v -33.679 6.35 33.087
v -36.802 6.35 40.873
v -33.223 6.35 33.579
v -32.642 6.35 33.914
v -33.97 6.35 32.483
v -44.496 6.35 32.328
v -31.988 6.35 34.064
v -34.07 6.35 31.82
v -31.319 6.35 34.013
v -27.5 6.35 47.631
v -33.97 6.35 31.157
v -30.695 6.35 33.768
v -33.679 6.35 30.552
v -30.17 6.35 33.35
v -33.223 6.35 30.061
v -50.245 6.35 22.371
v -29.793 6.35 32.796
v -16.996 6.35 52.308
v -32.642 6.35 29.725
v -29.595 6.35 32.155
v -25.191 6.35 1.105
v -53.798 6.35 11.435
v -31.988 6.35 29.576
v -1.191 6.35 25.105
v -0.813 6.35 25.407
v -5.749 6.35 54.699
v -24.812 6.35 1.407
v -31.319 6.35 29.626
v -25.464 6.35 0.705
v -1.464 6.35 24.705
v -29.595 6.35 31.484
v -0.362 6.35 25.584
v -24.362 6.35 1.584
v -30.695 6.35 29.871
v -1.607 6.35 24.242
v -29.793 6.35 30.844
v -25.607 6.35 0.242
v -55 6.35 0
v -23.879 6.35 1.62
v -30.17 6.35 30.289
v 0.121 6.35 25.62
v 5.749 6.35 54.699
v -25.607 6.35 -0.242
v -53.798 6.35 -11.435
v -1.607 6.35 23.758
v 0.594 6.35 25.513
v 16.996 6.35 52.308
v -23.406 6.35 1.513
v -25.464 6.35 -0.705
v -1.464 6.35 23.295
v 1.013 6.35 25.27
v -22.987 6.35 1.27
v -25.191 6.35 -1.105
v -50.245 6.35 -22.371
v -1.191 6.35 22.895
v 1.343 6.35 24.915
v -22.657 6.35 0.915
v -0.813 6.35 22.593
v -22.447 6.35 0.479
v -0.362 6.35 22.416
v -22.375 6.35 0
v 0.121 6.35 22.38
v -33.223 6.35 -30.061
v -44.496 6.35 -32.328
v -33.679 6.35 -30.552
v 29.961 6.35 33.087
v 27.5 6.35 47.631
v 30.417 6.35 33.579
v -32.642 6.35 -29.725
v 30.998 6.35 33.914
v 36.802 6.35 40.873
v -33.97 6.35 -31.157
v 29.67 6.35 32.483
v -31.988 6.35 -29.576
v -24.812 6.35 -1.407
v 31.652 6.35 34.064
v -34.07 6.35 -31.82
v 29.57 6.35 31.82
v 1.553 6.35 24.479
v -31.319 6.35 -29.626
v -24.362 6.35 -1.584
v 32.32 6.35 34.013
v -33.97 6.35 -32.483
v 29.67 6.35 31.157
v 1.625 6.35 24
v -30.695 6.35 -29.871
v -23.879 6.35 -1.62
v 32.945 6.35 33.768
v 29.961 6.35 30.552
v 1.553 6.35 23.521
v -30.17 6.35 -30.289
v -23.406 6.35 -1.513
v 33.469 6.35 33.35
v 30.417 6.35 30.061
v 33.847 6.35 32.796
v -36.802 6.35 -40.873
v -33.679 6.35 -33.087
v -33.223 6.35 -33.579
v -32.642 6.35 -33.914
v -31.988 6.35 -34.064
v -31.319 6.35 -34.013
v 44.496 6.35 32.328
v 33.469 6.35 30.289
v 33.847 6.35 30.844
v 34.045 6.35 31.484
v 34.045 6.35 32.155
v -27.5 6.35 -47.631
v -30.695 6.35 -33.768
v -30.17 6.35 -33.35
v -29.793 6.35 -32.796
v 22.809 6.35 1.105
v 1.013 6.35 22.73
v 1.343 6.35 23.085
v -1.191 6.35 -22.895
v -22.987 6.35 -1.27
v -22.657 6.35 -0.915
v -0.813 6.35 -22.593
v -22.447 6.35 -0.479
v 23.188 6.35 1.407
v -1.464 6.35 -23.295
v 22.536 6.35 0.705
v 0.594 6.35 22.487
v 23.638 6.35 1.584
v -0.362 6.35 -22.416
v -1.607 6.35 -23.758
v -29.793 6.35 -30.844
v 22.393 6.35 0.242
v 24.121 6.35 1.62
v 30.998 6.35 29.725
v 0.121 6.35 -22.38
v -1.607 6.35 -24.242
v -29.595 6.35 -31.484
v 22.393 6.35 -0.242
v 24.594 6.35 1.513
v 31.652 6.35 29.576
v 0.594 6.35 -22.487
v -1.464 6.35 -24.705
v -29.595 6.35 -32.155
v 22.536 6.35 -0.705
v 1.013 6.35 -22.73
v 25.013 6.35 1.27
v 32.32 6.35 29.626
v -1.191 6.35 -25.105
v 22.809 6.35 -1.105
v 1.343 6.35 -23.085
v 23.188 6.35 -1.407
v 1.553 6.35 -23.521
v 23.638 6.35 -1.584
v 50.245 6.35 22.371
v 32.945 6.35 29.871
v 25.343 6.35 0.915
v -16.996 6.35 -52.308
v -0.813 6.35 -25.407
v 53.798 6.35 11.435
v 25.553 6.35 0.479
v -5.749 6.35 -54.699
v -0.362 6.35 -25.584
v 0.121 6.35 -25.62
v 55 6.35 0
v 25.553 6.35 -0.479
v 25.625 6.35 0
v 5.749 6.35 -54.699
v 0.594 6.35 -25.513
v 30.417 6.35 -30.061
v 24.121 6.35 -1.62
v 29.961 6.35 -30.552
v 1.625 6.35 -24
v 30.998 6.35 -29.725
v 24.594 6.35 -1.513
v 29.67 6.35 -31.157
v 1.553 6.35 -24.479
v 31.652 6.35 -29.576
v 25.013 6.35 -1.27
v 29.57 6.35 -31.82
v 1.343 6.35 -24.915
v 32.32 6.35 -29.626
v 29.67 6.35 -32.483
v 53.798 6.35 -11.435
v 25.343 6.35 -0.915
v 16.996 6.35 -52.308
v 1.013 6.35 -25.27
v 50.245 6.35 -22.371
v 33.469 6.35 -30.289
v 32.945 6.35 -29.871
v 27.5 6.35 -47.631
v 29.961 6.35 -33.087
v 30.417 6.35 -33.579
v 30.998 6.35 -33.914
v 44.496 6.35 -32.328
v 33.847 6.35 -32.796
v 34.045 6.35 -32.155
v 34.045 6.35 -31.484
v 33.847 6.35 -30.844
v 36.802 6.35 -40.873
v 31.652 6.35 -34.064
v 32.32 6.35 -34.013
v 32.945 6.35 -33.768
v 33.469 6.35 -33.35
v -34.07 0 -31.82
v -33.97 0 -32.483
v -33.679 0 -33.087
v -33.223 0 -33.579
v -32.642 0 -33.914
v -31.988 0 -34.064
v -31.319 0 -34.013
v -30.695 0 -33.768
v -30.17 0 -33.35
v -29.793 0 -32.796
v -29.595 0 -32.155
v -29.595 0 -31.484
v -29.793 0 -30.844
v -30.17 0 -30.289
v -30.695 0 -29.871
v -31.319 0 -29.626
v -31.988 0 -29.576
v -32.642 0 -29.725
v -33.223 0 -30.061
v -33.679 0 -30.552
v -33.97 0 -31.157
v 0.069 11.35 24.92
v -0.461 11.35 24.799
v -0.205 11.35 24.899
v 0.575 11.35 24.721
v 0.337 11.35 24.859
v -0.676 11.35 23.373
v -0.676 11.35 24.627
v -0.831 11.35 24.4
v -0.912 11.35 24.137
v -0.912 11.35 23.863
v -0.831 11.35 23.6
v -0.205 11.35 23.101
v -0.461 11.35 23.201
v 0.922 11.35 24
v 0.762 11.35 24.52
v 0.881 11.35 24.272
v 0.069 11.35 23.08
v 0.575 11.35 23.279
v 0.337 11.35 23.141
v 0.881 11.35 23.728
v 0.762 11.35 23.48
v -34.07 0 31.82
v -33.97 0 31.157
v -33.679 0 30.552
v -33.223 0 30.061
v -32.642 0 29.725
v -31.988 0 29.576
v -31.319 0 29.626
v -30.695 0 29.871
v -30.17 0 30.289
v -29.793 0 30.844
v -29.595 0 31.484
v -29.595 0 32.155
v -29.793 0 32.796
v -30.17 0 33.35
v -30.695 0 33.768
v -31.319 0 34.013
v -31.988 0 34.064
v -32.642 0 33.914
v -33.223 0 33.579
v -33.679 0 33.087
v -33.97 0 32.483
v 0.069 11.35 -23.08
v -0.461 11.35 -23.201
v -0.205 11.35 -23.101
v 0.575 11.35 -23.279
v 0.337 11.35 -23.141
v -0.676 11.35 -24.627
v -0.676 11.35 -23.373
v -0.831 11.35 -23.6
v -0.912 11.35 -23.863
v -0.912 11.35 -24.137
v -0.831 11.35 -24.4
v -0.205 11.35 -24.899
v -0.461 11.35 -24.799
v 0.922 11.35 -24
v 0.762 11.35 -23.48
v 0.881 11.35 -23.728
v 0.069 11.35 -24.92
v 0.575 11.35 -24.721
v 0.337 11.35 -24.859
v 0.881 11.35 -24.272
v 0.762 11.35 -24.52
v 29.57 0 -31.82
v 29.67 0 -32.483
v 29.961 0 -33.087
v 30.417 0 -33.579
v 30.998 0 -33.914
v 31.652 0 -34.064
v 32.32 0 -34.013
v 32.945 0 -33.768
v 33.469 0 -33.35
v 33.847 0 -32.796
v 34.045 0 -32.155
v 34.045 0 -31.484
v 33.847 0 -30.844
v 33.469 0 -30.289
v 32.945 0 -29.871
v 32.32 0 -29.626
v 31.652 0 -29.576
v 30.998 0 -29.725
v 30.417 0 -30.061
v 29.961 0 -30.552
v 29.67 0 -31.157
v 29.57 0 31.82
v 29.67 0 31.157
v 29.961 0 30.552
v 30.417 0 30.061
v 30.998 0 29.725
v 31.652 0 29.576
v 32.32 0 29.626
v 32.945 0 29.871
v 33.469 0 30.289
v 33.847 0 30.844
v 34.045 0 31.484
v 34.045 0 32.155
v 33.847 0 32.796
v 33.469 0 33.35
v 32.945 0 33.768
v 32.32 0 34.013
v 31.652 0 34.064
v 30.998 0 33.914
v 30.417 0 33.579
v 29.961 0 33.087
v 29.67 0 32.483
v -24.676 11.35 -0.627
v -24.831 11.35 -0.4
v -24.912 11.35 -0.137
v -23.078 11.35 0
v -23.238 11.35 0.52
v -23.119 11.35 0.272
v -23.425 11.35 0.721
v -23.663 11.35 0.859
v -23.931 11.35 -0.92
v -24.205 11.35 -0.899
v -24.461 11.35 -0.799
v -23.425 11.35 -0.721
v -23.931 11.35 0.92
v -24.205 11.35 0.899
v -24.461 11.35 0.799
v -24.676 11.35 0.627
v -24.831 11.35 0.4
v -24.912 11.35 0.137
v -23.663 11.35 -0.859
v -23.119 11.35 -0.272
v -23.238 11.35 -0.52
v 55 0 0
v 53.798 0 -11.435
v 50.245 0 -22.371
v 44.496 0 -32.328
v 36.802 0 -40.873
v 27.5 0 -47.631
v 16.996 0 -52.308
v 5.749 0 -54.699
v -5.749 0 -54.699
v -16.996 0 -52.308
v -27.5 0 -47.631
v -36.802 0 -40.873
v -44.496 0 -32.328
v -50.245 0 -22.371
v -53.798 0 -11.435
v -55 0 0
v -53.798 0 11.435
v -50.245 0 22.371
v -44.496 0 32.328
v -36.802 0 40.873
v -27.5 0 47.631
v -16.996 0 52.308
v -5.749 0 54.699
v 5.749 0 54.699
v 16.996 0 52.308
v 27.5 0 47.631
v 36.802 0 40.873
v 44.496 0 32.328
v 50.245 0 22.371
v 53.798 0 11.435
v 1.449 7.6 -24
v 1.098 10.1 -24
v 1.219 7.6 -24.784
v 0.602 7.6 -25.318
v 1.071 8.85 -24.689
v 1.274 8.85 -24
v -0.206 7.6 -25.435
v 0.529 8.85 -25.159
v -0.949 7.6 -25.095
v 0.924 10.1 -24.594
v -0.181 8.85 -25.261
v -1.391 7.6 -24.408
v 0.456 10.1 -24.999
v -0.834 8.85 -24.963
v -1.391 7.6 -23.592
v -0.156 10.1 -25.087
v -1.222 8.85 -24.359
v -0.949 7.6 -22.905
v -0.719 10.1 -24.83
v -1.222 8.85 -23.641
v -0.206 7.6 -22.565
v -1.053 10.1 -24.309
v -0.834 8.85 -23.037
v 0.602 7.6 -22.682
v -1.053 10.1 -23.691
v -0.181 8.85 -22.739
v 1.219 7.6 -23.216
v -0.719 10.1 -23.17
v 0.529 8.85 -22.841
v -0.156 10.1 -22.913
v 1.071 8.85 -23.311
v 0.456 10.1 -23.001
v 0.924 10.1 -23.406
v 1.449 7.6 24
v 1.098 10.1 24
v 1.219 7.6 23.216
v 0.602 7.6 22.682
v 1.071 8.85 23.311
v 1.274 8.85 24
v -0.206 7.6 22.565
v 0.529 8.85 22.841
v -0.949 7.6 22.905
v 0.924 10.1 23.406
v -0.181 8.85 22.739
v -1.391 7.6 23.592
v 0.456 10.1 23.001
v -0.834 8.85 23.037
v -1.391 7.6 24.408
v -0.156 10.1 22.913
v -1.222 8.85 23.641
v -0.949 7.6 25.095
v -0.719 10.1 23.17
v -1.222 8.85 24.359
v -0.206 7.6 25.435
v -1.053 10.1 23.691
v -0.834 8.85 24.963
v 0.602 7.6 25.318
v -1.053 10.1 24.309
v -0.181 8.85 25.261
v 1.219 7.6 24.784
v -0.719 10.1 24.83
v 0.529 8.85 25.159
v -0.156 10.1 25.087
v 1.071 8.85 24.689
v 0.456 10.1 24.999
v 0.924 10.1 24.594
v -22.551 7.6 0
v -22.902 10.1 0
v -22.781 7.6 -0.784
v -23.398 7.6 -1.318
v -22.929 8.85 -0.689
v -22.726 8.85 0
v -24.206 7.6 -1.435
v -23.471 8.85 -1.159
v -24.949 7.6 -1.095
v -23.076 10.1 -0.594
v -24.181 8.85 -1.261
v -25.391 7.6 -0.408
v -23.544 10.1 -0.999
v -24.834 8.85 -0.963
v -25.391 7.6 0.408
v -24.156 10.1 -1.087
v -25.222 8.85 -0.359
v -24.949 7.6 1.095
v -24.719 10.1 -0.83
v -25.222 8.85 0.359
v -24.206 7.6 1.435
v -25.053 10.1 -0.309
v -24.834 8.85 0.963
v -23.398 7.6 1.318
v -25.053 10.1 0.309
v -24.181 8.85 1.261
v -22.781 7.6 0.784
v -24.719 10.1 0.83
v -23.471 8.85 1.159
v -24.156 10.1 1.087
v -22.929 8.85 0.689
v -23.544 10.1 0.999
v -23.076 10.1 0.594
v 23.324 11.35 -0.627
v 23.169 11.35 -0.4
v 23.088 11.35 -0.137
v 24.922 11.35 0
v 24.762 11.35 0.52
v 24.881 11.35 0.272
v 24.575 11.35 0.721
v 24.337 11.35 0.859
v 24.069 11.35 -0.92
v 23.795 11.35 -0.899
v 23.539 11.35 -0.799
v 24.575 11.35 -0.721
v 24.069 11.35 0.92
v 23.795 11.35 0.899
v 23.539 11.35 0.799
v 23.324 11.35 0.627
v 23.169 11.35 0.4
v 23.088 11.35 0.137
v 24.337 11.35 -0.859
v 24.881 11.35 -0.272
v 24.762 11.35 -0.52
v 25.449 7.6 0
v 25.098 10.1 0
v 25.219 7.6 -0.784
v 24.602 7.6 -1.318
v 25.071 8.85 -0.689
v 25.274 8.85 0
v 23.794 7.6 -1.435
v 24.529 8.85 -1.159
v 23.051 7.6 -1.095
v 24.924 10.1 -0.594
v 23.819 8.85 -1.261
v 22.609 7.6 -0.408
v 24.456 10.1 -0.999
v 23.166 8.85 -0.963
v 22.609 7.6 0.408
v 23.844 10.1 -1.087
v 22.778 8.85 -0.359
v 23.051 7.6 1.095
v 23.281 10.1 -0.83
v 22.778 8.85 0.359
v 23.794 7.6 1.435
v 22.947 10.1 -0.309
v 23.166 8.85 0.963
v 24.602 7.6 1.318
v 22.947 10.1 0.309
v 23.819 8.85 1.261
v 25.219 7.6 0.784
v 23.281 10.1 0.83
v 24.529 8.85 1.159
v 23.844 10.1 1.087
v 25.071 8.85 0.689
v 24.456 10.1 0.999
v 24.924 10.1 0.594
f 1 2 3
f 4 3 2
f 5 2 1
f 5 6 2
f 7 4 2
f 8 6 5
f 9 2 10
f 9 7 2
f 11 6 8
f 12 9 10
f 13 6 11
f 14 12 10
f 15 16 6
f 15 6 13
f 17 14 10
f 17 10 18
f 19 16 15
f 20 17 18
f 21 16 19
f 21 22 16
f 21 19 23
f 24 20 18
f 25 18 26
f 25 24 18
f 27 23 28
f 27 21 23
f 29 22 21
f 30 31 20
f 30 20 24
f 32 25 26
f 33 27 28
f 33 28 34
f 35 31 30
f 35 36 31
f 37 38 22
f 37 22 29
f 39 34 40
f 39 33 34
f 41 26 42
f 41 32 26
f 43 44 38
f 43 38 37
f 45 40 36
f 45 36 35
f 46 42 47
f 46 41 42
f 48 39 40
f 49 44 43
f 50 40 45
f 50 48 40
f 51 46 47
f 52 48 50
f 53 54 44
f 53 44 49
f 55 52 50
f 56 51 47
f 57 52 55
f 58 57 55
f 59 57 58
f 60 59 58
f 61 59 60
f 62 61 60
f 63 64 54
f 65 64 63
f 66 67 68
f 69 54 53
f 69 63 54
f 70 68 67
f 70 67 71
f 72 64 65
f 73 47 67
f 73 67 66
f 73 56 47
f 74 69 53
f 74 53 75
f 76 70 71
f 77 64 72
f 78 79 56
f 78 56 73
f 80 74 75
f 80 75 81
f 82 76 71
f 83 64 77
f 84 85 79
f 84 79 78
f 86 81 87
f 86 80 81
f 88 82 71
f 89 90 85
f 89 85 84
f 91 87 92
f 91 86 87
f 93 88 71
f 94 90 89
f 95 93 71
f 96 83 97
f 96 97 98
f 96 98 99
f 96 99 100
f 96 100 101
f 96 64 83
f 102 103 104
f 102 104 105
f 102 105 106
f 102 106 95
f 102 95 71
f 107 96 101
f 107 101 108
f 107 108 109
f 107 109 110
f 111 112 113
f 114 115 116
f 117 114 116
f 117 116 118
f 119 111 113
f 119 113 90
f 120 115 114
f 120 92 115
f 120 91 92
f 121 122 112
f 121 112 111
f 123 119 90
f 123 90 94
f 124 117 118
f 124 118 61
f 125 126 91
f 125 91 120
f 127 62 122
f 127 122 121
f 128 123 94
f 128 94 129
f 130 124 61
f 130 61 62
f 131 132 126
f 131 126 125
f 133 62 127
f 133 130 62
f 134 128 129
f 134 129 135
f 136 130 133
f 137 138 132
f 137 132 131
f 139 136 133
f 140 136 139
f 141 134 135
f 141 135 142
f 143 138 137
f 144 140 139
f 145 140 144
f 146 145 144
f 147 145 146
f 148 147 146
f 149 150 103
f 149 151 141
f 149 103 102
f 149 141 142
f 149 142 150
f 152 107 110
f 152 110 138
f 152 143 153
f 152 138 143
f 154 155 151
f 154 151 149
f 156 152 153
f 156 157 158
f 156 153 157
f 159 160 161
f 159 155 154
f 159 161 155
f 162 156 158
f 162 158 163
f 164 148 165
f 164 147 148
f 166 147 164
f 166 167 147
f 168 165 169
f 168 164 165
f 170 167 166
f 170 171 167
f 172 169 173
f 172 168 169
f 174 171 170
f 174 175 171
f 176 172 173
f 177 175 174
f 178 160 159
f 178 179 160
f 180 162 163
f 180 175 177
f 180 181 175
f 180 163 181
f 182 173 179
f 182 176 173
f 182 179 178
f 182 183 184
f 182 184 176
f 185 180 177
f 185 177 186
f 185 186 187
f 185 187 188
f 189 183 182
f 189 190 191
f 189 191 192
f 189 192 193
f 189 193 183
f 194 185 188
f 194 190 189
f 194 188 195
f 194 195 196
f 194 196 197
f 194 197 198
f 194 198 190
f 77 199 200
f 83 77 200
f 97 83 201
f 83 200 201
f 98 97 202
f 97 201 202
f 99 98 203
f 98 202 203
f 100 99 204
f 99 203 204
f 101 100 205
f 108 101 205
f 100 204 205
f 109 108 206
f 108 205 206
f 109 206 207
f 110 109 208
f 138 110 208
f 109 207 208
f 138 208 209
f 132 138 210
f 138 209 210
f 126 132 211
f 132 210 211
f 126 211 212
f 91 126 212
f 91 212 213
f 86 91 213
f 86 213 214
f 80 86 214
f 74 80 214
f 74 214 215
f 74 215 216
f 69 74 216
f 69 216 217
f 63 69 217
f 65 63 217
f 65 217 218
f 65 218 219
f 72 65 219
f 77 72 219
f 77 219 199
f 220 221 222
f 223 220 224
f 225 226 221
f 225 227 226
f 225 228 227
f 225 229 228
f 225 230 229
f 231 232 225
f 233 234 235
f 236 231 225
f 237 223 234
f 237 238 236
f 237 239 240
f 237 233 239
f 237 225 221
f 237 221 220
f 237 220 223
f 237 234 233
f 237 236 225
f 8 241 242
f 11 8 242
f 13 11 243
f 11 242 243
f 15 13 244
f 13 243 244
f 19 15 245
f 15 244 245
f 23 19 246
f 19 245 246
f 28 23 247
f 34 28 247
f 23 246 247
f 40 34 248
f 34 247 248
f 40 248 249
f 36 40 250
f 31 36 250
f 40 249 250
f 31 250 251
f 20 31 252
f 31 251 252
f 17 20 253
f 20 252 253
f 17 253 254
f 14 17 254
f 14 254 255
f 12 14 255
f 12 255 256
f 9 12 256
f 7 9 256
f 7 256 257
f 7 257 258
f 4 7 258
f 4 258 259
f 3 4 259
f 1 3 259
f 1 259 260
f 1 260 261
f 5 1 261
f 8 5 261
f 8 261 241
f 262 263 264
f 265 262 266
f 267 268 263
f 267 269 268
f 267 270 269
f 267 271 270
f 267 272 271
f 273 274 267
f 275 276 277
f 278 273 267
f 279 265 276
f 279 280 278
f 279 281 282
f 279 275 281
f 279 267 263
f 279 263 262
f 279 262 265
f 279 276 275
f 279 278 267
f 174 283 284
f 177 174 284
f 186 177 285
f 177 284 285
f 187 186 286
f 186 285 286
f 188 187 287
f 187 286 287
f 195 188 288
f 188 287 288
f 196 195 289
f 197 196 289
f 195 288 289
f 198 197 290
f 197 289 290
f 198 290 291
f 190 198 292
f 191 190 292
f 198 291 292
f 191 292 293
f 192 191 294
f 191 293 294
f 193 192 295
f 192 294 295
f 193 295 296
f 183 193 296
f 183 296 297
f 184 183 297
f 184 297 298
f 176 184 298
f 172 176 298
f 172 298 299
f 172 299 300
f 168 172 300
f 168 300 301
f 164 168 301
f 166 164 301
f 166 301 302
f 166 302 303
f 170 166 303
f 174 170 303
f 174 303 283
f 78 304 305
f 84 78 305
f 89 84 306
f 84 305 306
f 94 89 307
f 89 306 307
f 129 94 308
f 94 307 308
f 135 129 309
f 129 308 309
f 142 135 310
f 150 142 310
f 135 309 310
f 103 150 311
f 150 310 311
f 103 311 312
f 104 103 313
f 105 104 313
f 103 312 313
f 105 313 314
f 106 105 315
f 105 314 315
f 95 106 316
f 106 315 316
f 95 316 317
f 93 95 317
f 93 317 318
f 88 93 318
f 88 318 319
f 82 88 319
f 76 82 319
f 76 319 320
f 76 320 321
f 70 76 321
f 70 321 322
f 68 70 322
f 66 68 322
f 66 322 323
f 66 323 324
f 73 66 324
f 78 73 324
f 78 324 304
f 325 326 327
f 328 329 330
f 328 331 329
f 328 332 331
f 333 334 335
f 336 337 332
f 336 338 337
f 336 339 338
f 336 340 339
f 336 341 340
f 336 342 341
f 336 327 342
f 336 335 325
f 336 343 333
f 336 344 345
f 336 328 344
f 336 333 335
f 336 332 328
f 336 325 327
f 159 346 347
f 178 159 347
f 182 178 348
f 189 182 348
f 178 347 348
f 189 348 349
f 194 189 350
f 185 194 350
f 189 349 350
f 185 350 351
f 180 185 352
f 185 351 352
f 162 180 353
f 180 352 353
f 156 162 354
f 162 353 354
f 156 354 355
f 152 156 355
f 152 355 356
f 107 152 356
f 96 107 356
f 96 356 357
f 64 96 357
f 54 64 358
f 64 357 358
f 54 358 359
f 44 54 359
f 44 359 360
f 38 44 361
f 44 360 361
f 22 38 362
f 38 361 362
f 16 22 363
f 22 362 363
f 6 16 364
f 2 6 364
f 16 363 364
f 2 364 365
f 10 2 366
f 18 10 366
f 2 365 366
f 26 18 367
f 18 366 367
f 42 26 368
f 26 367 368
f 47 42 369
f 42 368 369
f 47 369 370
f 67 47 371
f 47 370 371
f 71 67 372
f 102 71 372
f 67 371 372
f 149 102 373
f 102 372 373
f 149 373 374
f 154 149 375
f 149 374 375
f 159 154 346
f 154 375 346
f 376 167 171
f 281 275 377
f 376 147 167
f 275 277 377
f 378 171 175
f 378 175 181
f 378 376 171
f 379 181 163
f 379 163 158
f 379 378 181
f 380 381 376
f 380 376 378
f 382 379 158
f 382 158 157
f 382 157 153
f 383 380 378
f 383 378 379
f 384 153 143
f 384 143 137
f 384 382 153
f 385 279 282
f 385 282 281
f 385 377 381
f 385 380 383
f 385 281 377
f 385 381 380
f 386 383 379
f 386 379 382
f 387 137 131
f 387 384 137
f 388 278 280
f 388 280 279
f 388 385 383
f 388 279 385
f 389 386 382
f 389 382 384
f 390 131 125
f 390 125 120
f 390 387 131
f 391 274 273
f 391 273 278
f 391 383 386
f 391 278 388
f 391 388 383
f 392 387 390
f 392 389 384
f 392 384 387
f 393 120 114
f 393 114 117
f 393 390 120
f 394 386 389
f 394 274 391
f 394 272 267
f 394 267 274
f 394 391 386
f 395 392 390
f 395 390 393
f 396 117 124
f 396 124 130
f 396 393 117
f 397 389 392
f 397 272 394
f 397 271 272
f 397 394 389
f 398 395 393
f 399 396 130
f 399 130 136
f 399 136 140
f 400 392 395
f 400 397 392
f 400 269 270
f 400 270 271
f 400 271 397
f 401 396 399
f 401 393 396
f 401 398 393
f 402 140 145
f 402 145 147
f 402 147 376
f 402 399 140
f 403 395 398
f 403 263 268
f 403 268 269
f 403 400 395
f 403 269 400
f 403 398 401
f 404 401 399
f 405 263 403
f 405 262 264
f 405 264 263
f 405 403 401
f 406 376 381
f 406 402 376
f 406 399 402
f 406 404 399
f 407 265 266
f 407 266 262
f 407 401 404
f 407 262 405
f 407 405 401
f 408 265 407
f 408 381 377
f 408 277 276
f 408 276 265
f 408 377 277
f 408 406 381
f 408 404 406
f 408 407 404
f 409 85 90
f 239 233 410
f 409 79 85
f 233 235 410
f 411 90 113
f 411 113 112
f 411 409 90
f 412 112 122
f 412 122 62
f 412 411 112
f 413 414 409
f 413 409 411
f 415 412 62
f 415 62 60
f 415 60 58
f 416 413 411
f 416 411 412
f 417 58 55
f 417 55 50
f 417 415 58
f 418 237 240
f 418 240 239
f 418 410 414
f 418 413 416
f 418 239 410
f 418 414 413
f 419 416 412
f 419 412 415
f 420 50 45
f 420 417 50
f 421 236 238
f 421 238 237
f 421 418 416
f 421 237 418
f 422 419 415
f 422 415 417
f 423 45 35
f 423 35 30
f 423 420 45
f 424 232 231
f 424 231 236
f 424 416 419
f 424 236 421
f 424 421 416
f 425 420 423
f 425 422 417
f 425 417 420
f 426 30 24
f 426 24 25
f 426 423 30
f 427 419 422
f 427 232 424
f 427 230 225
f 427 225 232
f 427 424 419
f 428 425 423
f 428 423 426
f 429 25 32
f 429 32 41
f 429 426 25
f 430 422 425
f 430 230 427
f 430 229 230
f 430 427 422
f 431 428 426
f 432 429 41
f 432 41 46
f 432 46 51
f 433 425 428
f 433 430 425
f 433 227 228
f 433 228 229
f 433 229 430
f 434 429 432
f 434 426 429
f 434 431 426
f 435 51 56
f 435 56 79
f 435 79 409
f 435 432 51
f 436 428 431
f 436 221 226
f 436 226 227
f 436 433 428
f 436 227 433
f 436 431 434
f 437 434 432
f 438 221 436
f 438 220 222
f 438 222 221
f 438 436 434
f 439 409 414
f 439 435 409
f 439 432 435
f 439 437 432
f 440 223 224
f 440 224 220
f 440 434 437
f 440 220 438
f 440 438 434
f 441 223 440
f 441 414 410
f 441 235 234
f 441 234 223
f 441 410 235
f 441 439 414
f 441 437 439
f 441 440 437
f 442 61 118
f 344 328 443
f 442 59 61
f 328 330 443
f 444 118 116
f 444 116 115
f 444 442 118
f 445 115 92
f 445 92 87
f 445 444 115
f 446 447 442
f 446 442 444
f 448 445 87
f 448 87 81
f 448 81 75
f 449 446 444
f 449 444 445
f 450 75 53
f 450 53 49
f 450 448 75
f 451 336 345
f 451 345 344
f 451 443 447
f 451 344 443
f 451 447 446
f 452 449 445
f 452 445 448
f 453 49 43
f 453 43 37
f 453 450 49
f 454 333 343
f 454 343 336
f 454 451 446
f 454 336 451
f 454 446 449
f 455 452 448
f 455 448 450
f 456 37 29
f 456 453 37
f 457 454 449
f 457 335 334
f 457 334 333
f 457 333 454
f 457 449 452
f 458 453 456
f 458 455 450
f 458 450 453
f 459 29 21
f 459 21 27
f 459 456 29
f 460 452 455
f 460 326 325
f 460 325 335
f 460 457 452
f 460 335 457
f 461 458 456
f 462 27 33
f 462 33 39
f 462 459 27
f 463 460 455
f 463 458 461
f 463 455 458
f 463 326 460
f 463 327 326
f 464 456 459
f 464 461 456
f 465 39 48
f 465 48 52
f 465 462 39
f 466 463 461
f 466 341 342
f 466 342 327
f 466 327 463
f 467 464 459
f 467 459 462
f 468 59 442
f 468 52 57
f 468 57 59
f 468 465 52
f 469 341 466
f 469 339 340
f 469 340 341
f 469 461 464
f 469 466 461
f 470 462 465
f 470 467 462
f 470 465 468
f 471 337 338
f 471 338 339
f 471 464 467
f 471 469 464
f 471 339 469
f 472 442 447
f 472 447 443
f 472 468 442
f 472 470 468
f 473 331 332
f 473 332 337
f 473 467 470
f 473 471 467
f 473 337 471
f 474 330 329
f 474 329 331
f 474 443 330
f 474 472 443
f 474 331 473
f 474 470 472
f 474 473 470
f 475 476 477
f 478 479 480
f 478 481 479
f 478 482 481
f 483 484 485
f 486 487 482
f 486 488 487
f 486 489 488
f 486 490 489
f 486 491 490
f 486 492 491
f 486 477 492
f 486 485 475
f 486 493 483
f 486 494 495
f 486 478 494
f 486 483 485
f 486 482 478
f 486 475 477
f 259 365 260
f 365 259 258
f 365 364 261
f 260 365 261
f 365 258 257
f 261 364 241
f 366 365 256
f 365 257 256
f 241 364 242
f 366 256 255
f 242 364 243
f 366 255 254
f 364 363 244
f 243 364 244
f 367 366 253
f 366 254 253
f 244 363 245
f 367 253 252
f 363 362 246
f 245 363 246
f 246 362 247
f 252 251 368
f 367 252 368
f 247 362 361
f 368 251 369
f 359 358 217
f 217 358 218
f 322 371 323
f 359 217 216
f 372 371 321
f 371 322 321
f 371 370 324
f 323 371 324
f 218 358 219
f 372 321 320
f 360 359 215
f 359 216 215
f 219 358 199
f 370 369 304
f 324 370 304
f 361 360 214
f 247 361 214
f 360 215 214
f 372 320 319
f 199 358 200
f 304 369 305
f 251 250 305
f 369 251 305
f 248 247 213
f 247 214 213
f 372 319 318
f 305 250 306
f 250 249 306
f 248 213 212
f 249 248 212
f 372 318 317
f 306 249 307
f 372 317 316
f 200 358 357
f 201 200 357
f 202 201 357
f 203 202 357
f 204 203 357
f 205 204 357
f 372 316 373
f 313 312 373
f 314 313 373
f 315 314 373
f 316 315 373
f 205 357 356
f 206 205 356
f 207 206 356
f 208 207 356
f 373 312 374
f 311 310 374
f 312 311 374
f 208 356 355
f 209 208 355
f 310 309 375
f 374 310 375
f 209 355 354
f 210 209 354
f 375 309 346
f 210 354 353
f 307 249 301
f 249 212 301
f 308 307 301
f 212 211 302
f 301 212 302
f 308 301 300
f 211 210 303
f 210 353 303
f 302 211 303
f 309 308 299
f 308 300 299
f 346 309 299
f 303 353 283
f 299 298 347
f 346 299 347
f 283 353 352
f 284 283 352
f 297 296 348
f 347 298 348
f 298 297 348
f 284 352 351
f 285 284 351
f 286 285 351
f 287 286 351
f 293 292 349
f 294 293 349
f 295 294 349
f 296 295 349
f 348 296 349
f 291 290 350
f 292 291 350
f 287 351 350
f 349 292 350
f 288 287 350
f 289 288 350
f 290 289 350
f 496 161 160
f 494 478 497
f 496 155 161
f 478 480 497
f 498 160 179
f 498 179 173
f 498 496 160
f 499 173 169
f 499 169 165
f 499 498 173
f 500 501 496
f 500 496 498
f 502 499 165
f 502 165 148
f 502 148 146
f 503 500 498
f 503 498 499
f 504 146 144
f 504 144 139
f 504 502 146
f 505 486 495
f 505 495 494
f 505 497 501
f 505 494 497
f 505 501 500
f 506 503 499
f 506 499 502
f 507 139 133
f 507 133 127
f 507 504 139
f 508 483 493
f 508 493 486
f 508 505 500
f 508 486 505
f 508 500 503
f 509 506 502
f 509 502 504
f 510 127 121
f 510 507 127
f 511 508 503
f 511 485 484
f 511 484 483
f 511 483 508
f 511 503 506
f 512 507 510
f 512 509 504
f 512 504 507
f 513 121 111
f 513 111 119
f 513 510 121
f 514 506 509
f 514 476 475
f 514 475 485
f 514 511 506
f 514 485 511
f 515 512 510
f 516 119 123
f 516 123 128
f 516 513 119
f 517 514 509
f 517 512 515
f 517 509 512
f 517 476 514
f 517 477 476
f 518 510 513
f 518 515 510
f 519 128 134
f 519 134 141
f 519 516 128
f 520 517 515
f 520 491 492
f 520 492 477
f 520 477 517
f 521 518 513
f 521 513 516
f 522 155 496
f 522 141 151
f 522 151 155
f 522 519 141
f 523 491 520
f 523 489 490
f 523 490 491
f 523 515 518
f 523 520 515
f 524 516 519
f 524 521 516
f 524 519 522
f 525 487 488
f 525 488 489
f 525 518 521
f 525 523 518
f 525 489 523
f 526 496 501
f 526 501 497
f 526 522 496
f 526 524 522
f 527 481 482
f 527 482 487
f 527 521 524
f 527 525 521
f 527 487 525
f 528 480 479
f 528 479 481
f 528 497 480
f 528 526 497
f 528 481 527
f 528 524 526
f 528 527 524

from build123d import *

# Parameters (mm, degrees)
SKETCH1_R            = 55
BOSS_EXTRUDE1_DEPTH  = 6.35
SKETCH2_R            = 1.625
BOSS_EXTRUDE2_DEPTH  = 5
BOSS_EXTRUDE2_TAPER  = 8
M4_CLEARANCE_HOLE1_D = 4.5


with BuildPart() as part:
    # Sketch1 → Boss-Extrude1 (new body)
    with BuildSketch(Plane(origin=(0, 0, 0), x_dir=(1, 0, 0), z_dir=(0, 1, 0))):
        Circle(SKETCH1_R)
    extrude(amount=BOSS_EXTRUDE1_DEPTH)

    # Sketch2 → Boss-Extrude2 (add)
    with BuildSketch(Plane(origin=(0, 6.35, 0), x_dir=(1, 0, 0), z_dir=(0, 1, 0))):
        with Locations((0, -24)):
            Circle(SKETCH2_R)
        with Locations((-24, 0)):
            Circle(SKETCH2_R)
        with Locations((0, 24)):
            Circle(SKETCH2_R)
        with Locations((24, 0)):
            Circle(SKETCH2_R)
    extrude(amount=BOSS_EXTRUDE2_DEPTH, taper=BOSS_EXTRUDE2_TAPER)

    # M4 Clearance Hole1 (through all)
    with Locations(Plane(origin=(0, 6.35, 0), x_dir=(1, 0, 0), z_dir=(0, 1, 0))):
        with Locations((-31.819805153, 31.819805153), (31.819805153, 31.819805153), (31.819805153, -31.819805153), (-31.819805153, -31.819805153)):
            Hole(M4_CLEARANCE_HOLE1_D / 2)


solid = part.part
